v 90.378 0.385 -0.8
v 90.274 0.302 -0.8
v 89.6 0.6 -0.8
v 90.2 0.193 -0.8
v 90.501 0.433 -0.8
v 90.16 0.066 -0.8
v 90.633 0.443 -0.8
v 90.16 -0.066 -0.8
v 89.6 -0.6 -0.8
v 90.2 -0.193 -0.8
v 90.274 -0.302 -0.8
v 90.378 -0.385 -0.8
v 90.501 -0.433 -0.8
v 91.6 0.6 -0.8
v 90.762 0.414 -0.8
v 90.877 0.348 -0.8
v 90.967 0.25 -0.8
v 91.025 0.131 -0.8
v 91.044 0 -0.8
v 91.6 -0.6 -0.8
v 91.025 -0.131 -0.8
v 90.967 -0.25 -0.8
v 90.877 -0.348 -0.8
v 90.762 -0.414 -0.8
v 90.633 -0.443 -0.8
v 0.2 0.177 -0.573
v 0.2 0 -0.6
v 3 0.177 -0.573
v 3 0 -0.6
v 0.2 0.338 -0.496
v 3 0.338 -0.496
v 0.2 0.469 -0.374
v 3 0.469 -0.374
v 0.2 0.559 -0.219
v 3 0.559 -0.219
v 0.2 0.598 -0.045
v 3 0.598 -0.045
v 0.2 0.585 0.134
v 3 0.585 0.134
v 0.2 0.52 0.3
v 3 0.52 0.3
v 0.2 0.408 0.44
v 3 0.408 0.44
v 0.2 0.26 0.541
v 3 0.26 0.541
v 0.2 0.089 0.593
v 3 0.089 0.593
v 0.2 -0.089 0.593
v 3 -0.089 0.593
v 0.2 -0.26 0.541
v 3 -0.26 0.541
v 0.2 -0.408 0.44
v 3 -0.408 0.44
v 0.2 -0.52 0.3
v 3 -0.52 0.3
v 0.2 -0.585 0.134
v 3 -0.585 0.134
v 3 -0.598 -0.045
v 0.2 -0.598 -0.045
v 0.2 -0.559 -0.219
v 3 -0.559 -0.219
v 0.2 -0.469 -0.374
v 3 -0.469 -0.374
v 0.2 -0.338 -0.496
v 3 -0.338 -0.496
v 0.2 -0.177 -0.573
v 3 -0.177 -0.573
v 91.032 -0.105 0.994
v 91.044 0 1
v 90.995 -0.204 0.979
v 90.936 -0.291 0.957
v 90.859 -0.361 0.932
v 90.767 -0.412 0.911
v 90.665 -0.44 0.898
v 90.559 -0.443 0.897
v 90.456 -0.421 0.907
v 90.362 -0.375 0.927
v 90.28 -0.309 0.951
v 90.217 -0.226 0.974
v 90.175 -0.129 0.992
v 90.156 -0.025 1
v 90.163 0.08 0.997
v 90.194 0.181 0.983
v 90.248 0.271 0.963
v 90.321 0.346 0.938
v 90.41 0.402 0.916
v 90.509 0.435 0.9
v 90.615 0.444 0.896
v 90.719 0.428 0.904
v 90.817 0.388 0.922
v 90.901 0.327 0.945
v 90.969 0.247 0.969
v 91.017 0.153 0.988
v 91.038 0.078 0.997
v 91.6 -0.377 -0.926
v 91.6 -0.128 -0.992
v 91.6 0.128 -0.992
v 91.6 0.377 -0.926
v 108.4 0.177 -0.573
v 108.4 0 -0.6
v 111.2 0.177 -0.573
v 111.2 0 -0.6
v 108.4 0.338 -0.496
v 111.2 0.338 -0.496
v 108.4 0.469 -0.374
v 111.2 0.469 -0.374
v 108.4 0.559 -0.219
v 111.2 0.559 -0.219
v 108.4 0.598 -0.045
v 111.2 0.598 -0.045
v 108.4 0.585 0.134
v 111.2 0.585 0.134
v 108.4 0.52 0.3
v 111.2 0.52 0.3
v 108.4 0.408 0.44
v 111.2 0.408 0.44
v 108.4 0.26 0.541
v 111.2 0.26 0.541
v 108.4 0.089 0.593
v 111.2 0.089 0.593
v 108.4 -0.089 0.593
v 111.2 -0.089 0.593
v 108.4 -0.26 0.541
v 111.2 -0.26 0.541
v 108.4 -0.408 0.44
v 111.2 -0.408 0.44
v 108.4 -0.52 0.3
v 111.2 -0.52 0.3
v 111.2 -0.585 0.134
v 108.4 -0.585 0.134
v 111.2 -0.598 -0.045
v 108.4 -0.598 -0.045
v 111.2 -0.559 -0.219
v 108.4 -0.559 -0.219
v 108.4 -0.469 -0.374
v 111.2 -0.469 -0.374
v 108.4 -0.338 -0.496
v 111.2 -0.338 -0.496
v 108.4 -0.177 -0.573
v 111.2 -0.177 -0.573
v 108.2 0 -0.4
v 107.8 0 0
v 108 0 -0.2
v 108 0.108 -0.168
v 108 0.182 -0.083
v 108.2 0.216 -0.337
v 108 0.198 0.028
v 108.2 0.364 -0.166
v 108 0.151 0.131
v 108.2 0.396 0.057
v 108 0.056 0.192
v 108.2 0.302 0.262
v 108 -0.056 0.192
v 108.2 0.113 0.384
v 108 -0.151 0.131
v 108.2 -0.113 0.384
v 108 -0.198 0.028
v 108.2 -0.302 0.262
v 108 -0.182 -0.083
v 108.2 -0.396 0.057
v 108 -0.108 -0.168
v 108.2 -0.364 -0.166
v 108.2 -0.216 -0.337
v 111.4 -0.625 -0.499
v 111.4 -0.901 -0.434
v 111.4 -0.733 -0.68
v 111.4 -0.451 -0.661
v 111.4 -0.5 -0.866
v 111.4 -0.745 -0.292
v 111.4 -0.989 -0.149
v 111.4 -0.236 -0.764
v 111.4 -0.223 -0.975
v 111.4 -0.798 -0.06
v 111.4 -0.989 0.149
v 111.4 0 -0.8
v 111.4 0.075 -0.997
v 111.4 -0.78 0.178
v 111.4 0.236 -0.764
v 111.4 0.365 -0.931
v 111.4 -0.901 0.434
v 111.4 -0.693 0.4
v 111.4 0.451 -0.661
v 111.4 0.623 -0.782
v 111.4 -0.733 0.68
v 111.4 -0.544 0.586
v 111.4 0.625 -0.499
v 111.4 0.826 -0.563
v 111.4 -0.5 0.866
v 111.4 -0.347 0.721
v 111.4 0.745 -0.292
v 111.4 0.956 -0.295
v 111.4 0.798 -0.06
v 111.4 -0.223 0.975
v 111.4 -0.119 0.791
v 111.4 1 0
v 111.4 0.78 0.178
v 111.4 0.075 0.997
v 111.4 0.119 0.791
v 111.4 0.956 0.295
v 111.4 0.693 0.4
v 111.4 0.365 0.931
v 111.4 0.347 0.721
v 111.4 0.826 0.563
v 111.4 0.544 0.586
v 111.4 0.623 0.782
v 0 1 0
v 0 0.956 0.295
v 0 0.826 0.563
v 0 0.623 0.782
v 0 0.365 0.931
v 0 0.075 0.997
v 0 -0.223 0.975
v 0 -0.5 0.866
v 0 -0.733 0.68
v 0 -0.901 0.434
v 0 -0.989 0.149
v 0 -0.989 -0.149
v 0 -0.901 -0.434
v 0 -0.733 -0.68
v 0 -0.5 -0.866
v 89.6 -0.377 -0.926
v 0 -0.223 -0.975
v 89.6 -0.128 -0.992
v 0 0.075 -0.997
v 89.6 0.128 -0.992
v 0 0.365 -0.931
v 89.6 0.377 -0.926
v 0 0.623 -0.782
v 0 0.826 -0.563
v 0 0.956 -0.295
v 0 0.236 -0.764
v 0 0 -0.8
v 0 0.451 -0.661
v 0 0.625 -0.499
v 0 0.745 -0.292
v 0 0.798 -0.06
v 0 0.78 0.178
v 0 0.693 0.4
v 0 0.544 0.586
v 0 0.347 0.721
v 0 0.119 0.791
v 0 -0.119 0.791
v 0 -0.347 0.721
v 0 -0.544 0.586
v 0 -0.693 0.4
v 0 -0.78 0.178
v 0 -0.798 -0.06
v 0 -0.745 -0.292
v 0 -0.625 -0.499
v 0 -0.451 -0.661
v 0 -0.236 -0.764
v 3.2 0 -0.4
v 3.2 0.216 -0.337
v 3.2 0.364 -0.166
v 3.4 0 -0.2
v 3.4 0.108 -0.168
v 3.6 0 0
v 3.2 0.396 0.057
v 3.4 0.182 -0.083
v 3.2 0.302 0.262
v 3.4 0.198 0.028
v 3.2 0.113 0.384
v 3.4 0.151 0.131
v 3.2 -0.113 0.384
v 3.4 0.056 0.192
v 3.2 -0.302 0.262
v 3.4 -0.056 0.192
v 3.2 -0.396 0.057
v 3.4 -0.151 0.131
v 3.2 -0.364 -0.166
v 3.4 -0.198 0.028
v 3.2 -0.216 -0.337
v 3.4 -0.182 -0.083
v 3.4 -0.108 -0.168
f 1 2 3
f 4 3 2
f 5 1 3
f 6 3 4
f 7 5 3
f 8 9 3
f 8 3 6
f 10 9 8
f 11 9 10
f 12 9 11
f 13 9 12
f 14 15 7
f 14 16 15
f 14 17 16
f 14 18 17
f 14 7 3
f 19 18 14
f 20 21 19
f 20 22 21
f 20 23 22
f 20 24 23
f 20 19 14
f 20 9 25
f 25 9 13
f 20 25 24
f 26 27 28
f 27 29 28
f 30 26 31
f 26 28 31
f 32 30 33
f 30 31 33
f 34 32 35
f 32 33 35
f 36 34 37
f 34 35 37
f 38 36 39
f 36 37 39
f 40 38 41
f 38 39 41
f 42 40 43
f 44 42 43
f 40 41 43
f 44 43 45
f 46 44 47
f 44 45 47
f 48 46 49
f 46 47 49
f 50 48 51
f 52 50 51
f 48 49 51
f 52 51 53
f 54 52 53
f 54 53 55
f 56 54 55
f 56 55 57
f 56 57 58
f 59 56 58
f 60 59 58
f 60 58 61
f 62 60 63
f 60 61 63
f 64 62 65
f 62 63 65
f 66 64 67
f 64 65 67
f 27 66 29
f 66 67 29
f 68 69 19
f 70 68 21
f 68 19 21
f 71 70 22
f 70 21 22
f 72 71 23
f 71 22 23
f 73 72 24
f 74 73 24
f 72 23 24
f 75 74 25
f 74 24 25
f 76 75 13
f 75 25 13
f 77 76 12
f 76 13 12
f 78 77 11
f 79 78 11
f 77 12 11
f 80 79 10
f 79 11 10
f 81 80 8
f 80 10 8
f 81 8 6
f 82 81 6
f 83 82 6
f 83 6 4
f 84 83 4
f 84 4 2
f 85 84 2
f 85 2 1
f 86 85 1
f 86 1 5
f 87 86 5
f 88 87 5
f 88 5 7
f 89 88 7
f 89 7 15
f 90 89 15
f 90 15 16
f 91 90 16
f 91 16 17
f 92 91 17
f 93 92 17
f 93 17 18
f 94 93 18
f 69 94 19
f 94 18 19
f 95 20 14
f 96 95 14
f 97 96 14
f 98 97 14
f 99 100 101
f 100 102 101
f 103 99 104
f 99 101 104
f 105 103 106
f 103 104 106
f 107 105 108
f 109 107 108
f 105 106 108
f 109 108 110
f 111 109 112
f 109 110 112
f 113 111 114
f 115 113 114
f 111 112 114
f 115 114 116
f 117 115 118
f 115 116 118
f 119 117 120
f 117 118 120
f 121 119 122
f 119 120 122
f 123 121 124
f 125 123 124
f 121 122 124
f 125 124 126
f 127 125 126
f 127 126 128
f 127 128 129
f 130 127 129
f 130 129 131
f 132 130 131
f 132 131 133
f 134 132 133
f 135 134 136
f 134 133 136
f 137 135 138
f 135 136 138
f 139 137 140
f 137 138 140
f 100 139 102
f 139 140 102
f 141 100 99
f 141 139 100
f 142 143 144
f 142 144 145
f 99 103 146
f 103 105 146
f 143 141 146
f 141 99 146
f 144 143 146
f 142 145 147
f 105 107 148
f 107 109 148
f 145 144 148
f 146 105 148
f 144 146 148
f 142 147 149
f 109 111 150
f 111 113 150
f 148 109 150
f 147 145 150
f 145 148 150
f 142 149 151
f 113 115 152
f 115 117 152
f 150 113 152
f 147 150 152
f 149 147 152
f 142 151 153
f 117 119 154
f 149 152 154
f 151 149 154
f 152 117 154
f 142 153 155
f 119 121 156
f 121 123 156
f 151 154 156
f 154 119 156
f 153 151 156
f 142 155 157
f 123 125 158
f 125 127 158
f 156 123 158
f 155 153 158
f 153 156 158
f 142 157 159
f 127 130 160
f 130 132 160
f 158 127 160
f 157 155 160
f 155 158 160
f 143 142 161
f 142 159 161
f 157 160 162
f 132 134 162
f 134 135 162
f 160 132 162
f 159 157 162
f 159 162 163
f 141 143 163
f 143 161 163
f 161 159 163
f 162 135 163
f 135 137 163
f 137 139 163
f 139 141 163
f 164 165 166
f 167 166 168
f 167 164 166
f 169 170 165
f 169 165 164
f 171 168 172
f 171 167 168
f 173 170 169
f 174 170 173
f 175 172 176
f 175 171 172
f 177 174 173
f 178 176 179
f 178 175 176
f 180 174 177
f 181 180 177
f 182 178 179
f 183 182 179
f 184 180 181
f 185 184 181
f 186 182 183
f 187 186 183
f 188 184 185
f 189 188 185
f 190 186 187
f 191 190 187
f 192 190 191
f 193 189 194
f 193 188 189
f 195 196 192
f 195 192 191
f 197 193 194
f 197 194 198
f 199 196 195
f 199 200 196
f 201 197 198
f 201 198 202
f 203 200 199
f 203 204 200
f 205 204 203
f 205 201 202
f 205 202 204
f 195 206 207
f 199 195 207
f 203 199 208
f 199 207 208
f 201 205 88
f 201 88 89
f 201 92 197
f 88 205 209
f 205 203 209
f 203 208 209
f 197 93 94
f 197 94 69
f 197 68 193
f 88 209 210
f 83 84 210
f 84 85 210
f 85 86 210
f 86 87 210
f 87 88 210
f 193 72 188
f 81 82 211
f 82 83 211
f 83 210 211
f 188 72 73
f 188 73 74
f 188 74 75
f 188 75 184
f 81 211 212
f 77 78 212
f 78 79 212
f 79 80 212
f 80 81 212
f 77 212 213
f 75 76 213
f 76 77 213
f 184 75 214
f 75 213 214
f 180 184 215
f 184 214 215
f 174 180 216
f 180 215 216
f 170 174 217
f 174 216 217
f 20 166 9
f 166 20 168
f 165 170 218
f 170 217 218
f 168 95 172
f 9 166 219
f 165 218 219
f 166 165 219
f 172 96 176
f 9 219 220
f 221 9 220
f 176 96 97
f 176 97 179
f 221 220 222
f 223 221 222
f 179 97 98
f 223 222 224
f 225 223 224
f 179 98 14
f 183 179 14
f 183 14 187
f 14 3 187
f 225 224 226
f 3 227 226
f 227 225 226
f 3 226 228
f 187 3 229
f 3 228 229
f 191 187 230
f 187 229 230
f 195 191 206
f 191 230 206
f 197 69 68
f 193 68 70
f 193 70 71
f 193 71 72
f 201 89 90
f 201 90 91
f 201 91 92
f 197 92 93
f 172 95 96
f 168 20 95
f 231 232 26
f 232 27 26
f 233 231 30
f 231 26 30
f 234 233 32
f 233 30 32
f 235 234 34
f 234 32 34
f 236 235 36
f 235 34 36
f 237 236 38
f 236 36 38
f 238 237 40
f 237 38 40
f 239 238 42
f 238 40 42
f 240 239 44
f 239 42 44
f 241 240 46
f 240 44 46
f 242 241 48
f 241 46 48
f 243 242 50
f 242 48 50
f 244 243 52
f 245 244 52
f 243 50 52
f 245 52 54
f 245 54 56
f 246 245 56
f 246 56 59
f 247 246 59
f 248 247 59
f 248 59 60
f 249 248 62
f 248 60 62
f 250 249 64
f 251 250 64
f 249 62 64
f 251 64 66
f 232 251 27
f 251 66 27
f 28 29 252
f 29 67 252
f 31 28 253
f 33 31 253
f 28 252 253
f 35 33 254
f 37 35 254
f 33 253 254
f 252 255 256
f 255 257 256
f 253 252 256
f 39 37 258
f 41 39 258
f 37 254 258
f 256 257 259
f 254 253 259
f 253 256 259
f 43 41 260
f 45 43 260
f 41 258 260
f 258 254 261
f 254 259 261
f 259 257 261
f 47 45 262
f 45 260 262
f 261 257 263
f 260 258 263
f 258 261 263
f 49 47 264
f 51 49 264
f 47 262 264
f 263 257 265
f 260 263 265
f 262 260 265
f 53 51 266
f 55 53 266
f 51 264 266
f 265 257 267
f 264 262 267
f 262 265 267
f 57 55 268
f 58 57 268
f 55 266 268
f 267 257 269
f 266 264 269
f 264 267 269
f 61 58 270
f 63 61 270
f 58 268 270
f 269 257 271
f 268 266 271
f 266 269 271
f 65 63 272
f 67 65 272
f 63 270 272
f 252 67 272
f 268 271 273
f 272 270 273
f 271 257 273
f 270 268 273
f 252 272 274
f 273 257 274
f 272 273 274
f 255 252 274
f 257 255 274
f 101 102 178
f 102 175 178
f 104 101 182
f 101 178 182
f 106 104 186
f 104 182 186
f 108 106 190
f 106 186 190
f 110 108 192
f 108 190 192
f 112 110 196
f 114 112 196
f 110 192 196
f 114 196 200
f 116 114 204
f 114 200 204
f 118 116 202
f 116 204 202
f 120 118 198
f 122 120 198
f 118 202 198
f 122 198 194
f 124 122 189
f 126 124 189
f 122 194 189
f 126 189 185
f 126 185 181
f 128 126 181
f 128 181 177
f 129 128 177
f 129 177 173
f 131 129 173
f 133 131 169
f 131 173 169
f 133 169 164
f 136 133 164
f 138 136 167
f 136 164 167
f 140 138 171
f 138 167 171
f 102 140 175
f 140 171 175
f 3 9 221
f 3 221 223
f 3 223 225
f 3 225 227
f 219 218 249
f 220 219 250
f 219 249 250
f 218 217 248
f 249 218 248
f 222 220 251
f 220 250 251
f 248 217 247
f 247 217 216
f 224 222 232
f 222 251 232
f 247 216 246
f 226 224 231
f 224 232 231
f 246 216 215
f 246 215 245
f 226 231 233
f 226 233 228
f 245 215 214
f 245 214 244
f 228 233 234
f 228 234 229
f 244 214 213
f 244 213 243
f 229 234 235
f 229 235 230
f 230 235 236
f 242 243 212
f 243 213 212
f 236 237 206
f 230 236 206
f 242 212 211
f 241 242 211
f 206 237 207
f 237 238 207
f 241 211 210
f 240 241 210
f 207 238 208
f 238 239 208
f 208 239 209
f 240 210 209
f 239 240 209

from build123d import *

# Parameters (mm, degrees)
F0_R     = 1
F1_DEPTH = 111.4
F2_W     = 2
F2_H     = 1
F3_DEPTH = 2.5
F6_R     = 0.4445
F7_DEPTH = 25


# Not quite as in the source:
# - a feature names something its author has since deleted; it is built from what else it names


with BuildPart() as f1:
    # F0 (on Right) → F1 (new body)
    with BuildSketch(Plane.YZ):
        Circle(F0_R)
    extrude(amount=F1_DEPTH)

    # F2 (on Front) → F3 (cut, symmetric)
    with BuildSketch(Plane.XZ):
        with Locations((90.6, -1.3)):
            Rectangle(F2_W, F2_H)
    extrude(amount=F3_DEPTH, both=True, mode=Mode.SUBTRACT)

    # F4 (on Front) → F5 (revolve, cut)
    with BuildSketch(Plane.XZ):
        Polygon((111.4, -0.8), (111.4, 0), (107.8, 0), (108.4, -0.6), (111.2, -0.6), align=None)
        Polygon((0.2, -0.6), (3, -0.6), (3.6, 0), (0, 0), (0, -0.8), align=None)
    revolve(axis=Axis((55.7, 0, 0), (1, 0, 0)), mode=Mode.SUBTRACT)

    # F6 (on face) → F7 (cut)
    with BuildSketch(Plane(origin=(0, 0, -0.8), x_dir=(1, 0, 0), z_dir=(0, 0, -1))):
        with Locations((90.6, 0)):
            Circle(F6_R)
    extrude(amount=-F7_DEPTH, mode=Mode.SUBTRACT)


solid = f1.part
